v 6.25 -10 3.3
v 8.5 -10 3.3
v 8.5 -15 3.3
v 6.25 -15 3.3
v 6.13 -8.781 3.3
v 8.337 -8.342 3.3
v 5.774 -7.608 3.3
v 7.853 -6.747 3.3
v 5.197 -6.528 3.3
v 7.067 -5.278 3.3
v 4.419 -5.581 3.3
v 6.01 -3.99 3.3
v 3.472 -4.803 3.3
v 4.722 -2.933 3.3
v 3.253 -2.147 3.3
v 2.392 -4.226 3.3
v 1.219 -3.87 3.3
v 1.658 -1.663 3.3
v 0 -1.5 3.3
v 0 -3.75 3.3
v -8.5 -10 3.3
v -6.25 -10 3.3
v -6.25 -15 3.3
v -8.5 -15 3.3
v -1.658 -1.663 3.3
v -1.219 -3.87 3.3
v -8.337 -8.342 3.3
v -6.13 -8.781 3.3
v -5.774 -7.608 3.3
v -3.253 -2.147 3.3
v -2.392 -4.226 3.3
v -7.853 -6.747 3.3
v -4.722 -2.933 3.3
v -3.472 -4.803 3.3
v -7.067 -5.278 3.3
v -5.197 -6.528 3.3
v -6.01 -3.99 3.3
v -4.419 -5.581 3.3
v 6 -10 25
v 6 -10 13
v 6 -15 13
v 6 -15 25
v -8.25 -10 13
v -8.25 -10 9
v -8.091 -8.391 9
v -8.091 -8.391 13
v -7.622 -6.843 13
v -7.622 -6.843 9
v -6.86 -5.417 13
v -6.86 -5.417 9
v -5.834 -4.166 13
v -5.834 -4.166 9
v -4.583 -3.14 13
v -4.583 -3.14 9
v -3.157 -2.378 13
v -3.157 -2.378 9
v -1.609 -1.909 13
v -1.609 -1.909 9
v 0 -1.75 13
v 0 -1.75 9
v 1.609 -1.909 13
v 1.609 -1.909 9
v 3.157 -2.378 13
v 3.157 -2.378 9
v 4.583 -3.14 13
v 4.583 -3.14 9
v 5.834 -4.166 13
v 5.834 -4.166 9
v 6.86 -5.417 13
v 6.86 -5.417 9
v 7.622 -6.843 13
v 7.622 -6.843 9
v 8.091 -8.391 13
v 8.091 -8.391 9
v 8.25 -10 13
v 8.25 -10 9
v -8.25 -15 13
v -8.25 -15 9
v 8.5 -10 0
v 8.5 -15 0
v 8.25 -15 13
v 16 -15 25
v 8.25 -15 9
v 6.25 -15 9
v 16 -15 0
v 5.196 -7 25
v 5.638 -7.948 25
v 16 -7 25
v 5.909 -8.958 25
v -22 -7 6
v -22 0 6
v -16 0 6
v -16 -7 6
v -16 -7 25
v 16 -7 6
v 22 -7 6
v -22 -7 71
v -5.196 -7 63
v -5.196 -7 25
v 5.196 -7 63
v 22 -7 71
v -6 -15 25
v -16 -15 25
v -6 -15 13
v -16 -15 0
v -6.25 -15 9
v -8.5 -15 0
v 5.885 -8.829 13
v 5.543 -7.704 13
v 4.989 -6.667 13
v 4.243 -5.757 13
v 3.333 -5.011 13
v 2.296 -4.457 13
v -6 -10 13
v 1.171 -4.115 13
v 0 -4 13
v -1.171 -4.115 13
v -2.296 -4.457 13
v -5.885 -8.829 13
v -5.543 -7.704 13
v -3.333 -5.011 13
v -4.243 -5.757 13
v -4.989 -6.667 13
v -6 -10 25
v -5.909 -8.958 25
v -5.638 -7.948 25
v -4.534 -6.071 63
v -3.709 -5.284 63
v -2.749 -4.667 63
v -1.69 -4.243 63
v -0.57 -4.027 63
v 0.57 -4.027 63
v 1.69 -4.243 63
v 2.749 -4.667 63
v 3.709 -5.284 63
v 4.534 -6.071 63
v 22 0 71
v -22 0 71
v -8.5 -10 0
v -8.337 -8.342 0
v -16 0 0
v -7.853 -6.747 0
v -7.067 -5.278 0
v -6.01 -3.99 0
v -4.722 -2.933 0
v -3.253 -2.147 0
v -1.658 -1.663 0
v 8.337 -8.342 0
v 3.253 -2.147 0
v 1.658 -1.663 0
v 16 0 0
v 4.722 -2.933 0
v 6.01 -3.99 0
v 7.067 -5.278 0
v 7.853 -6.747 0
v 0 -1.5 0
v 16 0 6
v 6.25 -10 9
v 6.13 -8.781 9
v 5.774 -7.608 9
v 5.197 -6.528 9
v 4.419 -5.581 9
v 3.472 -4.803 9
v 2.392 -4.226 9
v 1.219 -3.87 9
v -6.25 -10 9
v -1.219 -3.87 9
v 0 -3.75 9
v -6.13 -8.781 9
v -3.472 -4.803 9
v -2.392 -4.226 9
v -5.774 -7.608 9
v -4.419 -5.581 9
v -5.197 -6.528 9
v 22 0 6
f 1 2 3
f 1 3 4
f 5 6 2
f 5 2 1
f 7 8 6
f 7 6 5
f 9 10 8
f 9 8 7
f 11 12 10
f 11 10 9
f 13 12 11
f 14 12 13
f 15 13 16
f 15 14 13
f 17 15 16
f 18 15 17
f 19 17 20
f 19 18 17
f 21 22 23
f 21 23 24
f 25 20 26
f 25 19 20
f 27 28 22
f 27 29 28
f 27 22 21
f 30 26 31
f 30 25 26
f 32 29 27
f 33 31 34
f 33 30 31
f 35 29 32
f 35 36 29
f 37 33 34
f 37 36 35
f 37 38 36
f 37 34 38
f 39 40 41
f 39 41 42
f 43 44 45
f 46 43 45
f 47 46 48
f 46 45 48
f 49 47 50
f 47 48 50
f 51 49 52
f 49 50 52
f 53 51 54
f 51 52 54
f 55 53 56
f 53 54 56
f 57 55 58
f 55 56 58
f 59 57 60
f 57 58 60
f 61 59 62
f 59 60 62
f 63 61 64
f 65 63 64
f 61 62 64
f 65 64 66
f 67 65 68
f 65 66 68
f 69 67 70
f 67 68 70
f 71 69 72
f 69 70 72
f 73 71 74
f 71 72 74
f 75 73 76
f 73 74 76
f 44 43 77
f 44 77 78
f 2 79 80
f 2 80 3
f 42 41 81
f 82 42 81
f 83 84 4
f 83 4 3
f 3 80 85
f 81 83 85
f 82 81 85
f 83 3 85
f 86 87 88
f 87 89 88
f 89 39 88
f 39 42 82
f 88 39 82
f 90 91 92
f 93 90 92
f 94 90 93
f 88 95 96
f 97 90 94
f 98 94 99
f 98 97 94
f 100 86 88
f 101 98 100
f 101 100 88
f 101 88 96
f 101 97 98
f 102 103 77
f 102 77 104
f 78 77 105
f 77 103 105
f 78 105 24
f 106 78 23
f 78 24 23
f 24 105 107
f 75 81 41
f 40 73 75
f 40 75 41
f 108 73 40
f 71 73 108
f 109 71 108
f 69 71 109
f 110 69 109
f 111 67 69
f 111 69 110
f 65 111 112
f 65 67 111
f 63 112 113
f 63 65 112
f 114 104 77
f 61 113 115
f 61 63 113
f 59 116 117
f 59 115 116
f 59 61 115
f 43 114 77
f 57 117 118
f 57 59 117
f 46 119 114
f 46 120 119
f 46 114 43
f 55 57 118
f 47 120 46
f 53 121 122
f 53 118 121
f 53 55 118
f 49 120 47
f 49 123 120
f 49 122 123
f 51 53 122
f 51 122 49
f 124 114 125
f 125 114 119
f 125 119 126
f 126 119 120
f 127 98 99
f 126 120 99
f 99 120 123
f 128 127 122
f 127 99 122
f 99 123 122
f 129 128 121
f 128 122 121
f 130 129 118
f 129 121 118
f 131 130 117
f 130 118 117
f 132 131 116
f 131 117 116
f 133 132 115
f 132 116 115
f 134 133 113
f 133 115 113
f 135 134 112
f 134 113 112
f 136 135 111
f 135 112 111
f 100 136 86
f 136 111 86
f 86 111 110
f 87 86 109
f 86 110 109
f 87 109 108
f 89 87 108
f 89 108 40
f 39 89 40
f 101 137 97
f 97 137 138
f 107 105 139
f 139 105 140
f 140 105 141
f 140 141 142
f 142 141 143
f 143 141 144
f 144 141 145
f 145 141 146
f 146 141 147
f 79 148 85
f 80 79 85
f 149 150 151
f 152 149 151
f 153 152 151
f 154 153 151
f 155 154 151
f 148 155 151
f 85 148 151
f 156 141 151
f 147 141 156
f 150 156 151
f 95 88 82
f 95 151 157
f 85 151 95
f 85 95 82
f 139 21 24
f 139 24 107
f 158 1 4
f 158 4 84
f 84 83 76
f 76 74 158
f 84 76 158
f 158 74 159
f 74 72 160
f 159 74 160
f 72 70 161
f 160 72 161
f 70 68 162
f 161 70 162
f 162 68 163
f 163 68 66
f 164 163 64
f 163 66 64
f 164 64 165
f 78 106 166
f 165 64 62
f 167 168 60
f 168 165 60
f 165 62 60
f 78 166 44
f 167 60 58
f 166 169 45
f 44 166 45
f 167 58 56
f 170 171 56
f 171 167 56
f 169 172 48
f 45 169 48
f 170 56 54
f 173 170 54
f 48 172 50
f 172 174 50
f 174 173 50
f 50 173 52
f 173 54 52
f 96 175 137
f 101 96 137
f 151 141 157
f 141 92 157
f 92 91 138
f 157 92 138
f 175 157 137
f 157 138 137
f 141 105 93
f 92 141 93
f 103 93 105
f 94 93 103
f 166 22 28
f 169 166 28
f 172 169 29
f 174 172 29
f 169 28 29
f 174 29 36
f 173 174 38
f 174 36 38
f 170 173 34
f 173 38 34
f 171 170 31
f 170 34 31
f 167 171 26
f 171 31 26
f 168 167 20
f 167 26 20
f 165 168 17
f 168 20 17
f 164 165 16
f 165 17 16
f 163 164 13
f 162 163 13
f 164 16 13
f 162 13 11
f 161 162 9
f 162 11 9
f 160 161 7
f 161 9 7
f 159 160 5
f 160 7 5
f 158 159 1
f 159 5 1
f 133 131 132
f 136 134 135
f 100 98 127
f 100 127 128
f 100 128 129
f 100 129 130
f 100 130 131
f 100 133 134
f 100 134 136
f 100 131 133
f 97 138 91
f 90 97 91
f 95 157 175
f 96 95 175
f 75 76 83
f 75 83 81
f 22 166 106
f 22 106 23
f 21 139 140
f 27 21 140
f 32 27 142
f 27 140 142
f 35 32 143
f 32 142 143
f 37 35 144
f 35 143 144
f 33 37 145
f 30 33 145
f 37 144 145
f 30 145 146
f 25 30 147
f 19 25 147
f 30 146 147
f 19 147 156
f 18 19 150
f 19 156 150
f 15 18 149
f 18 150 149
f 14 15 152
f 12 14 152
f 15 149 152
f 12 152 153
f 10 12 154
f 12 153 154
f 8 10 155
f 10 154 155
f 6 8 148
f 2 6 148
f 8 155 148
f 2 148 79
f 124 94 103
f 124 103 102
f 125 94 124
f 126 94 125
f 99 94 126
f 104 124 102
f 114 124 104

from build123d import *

# Parameters (mm, degrees)
F1_DEPTH  = 7
F2_W      = 32
F2_H      = 3
F3_DEPTH  = 25
F4_R      = 8.5
F5_DEPTH  = 3.3
F6_R      = 6.25
F7_DEPTH  = 5.7
F8_R      = 8.25
F9_DEPTH  = 4
F10_R     = 6
F11_DEPTH = 50
F12_DEPTH = 5


with BuildPart() as f1:
    # F0 (on Front) → F1 (new body)
    with BuildSketch(Plane.XZ):
        Polygon((-16, 0), (0, 0), (16, 0), (16, 6), (22, 6), (22, 71), (0, 71), (-22, 71), (-22, 6), (-16, 6), align=None)
    extrude(amount=F1_DEPTH)

    # F2 (on face) → F3 (join)
    with BuildSketch(Plane(origin=(0, 0, 0), x_dir=(1, 0, 0), z_dir=(0, 0, -1))):
        with Locations((0, 8.5)):
            Rectangle(F2_W, F2_H)
    extrude(amount=-F3_DEPTH)

    # F4 (on face) → F5 (cut)
    with BuildSketch(Plane(origin=(0, 0, 0), x_dir=(1, 0, 0), z_dir=(0, 0, -1))):
        with Locations((0, 10)):
            Circle(F4_R)
    extrude(amount=-F5_DEPTH, mode=Mode.SUBTRACT)

    # F6 (on face) → F7 (cut)
    with BuildSketch(Plane(origin=(0, 0, 3.3), x_dir=(1, 0, 0), z_dir=(0, 0, -1))):
        with Locations((0, 10)):
            Circle(F6_R)
    extrude(amount=-F7_DEPTH, mode=Mode.SUBTRACT)

    # F8 (on face) → F9 (cut)
    with BuildSketch(Plane(origin=(0, 0, 9), x_dir=(1, 0, 0), z_dir=(0, 0, -1))):
        with Locations((0, 10)):
            Circle(F8_R)
    extrude(amount=-F9_DEPTH, mode=Mode.SUBTRACT)

    # F10 (on face) → F11 (cut)
    with BuildSketch(Plane(origin=(0, 0, 13), x_dir=(1, 0, 0), z_dir=(0, 0, -1))):
        with Locations((0, 10)):
            Circle(F10_R)
    extrude(amount=-F11_DEPTH, mode=Mode.SUBTRACT)

    # F12 (add): faces of the model
    f12_faces = [f1.faces().sort_by_distance(p)[0] for p in [
        (-11.3145331244, -10, 12.9844320761),
        (11.3145331244, -10, 12.9844320761),
    ]]
    extrude(f12_faces, amount=F12_DEPTH)


solid = f1.part
